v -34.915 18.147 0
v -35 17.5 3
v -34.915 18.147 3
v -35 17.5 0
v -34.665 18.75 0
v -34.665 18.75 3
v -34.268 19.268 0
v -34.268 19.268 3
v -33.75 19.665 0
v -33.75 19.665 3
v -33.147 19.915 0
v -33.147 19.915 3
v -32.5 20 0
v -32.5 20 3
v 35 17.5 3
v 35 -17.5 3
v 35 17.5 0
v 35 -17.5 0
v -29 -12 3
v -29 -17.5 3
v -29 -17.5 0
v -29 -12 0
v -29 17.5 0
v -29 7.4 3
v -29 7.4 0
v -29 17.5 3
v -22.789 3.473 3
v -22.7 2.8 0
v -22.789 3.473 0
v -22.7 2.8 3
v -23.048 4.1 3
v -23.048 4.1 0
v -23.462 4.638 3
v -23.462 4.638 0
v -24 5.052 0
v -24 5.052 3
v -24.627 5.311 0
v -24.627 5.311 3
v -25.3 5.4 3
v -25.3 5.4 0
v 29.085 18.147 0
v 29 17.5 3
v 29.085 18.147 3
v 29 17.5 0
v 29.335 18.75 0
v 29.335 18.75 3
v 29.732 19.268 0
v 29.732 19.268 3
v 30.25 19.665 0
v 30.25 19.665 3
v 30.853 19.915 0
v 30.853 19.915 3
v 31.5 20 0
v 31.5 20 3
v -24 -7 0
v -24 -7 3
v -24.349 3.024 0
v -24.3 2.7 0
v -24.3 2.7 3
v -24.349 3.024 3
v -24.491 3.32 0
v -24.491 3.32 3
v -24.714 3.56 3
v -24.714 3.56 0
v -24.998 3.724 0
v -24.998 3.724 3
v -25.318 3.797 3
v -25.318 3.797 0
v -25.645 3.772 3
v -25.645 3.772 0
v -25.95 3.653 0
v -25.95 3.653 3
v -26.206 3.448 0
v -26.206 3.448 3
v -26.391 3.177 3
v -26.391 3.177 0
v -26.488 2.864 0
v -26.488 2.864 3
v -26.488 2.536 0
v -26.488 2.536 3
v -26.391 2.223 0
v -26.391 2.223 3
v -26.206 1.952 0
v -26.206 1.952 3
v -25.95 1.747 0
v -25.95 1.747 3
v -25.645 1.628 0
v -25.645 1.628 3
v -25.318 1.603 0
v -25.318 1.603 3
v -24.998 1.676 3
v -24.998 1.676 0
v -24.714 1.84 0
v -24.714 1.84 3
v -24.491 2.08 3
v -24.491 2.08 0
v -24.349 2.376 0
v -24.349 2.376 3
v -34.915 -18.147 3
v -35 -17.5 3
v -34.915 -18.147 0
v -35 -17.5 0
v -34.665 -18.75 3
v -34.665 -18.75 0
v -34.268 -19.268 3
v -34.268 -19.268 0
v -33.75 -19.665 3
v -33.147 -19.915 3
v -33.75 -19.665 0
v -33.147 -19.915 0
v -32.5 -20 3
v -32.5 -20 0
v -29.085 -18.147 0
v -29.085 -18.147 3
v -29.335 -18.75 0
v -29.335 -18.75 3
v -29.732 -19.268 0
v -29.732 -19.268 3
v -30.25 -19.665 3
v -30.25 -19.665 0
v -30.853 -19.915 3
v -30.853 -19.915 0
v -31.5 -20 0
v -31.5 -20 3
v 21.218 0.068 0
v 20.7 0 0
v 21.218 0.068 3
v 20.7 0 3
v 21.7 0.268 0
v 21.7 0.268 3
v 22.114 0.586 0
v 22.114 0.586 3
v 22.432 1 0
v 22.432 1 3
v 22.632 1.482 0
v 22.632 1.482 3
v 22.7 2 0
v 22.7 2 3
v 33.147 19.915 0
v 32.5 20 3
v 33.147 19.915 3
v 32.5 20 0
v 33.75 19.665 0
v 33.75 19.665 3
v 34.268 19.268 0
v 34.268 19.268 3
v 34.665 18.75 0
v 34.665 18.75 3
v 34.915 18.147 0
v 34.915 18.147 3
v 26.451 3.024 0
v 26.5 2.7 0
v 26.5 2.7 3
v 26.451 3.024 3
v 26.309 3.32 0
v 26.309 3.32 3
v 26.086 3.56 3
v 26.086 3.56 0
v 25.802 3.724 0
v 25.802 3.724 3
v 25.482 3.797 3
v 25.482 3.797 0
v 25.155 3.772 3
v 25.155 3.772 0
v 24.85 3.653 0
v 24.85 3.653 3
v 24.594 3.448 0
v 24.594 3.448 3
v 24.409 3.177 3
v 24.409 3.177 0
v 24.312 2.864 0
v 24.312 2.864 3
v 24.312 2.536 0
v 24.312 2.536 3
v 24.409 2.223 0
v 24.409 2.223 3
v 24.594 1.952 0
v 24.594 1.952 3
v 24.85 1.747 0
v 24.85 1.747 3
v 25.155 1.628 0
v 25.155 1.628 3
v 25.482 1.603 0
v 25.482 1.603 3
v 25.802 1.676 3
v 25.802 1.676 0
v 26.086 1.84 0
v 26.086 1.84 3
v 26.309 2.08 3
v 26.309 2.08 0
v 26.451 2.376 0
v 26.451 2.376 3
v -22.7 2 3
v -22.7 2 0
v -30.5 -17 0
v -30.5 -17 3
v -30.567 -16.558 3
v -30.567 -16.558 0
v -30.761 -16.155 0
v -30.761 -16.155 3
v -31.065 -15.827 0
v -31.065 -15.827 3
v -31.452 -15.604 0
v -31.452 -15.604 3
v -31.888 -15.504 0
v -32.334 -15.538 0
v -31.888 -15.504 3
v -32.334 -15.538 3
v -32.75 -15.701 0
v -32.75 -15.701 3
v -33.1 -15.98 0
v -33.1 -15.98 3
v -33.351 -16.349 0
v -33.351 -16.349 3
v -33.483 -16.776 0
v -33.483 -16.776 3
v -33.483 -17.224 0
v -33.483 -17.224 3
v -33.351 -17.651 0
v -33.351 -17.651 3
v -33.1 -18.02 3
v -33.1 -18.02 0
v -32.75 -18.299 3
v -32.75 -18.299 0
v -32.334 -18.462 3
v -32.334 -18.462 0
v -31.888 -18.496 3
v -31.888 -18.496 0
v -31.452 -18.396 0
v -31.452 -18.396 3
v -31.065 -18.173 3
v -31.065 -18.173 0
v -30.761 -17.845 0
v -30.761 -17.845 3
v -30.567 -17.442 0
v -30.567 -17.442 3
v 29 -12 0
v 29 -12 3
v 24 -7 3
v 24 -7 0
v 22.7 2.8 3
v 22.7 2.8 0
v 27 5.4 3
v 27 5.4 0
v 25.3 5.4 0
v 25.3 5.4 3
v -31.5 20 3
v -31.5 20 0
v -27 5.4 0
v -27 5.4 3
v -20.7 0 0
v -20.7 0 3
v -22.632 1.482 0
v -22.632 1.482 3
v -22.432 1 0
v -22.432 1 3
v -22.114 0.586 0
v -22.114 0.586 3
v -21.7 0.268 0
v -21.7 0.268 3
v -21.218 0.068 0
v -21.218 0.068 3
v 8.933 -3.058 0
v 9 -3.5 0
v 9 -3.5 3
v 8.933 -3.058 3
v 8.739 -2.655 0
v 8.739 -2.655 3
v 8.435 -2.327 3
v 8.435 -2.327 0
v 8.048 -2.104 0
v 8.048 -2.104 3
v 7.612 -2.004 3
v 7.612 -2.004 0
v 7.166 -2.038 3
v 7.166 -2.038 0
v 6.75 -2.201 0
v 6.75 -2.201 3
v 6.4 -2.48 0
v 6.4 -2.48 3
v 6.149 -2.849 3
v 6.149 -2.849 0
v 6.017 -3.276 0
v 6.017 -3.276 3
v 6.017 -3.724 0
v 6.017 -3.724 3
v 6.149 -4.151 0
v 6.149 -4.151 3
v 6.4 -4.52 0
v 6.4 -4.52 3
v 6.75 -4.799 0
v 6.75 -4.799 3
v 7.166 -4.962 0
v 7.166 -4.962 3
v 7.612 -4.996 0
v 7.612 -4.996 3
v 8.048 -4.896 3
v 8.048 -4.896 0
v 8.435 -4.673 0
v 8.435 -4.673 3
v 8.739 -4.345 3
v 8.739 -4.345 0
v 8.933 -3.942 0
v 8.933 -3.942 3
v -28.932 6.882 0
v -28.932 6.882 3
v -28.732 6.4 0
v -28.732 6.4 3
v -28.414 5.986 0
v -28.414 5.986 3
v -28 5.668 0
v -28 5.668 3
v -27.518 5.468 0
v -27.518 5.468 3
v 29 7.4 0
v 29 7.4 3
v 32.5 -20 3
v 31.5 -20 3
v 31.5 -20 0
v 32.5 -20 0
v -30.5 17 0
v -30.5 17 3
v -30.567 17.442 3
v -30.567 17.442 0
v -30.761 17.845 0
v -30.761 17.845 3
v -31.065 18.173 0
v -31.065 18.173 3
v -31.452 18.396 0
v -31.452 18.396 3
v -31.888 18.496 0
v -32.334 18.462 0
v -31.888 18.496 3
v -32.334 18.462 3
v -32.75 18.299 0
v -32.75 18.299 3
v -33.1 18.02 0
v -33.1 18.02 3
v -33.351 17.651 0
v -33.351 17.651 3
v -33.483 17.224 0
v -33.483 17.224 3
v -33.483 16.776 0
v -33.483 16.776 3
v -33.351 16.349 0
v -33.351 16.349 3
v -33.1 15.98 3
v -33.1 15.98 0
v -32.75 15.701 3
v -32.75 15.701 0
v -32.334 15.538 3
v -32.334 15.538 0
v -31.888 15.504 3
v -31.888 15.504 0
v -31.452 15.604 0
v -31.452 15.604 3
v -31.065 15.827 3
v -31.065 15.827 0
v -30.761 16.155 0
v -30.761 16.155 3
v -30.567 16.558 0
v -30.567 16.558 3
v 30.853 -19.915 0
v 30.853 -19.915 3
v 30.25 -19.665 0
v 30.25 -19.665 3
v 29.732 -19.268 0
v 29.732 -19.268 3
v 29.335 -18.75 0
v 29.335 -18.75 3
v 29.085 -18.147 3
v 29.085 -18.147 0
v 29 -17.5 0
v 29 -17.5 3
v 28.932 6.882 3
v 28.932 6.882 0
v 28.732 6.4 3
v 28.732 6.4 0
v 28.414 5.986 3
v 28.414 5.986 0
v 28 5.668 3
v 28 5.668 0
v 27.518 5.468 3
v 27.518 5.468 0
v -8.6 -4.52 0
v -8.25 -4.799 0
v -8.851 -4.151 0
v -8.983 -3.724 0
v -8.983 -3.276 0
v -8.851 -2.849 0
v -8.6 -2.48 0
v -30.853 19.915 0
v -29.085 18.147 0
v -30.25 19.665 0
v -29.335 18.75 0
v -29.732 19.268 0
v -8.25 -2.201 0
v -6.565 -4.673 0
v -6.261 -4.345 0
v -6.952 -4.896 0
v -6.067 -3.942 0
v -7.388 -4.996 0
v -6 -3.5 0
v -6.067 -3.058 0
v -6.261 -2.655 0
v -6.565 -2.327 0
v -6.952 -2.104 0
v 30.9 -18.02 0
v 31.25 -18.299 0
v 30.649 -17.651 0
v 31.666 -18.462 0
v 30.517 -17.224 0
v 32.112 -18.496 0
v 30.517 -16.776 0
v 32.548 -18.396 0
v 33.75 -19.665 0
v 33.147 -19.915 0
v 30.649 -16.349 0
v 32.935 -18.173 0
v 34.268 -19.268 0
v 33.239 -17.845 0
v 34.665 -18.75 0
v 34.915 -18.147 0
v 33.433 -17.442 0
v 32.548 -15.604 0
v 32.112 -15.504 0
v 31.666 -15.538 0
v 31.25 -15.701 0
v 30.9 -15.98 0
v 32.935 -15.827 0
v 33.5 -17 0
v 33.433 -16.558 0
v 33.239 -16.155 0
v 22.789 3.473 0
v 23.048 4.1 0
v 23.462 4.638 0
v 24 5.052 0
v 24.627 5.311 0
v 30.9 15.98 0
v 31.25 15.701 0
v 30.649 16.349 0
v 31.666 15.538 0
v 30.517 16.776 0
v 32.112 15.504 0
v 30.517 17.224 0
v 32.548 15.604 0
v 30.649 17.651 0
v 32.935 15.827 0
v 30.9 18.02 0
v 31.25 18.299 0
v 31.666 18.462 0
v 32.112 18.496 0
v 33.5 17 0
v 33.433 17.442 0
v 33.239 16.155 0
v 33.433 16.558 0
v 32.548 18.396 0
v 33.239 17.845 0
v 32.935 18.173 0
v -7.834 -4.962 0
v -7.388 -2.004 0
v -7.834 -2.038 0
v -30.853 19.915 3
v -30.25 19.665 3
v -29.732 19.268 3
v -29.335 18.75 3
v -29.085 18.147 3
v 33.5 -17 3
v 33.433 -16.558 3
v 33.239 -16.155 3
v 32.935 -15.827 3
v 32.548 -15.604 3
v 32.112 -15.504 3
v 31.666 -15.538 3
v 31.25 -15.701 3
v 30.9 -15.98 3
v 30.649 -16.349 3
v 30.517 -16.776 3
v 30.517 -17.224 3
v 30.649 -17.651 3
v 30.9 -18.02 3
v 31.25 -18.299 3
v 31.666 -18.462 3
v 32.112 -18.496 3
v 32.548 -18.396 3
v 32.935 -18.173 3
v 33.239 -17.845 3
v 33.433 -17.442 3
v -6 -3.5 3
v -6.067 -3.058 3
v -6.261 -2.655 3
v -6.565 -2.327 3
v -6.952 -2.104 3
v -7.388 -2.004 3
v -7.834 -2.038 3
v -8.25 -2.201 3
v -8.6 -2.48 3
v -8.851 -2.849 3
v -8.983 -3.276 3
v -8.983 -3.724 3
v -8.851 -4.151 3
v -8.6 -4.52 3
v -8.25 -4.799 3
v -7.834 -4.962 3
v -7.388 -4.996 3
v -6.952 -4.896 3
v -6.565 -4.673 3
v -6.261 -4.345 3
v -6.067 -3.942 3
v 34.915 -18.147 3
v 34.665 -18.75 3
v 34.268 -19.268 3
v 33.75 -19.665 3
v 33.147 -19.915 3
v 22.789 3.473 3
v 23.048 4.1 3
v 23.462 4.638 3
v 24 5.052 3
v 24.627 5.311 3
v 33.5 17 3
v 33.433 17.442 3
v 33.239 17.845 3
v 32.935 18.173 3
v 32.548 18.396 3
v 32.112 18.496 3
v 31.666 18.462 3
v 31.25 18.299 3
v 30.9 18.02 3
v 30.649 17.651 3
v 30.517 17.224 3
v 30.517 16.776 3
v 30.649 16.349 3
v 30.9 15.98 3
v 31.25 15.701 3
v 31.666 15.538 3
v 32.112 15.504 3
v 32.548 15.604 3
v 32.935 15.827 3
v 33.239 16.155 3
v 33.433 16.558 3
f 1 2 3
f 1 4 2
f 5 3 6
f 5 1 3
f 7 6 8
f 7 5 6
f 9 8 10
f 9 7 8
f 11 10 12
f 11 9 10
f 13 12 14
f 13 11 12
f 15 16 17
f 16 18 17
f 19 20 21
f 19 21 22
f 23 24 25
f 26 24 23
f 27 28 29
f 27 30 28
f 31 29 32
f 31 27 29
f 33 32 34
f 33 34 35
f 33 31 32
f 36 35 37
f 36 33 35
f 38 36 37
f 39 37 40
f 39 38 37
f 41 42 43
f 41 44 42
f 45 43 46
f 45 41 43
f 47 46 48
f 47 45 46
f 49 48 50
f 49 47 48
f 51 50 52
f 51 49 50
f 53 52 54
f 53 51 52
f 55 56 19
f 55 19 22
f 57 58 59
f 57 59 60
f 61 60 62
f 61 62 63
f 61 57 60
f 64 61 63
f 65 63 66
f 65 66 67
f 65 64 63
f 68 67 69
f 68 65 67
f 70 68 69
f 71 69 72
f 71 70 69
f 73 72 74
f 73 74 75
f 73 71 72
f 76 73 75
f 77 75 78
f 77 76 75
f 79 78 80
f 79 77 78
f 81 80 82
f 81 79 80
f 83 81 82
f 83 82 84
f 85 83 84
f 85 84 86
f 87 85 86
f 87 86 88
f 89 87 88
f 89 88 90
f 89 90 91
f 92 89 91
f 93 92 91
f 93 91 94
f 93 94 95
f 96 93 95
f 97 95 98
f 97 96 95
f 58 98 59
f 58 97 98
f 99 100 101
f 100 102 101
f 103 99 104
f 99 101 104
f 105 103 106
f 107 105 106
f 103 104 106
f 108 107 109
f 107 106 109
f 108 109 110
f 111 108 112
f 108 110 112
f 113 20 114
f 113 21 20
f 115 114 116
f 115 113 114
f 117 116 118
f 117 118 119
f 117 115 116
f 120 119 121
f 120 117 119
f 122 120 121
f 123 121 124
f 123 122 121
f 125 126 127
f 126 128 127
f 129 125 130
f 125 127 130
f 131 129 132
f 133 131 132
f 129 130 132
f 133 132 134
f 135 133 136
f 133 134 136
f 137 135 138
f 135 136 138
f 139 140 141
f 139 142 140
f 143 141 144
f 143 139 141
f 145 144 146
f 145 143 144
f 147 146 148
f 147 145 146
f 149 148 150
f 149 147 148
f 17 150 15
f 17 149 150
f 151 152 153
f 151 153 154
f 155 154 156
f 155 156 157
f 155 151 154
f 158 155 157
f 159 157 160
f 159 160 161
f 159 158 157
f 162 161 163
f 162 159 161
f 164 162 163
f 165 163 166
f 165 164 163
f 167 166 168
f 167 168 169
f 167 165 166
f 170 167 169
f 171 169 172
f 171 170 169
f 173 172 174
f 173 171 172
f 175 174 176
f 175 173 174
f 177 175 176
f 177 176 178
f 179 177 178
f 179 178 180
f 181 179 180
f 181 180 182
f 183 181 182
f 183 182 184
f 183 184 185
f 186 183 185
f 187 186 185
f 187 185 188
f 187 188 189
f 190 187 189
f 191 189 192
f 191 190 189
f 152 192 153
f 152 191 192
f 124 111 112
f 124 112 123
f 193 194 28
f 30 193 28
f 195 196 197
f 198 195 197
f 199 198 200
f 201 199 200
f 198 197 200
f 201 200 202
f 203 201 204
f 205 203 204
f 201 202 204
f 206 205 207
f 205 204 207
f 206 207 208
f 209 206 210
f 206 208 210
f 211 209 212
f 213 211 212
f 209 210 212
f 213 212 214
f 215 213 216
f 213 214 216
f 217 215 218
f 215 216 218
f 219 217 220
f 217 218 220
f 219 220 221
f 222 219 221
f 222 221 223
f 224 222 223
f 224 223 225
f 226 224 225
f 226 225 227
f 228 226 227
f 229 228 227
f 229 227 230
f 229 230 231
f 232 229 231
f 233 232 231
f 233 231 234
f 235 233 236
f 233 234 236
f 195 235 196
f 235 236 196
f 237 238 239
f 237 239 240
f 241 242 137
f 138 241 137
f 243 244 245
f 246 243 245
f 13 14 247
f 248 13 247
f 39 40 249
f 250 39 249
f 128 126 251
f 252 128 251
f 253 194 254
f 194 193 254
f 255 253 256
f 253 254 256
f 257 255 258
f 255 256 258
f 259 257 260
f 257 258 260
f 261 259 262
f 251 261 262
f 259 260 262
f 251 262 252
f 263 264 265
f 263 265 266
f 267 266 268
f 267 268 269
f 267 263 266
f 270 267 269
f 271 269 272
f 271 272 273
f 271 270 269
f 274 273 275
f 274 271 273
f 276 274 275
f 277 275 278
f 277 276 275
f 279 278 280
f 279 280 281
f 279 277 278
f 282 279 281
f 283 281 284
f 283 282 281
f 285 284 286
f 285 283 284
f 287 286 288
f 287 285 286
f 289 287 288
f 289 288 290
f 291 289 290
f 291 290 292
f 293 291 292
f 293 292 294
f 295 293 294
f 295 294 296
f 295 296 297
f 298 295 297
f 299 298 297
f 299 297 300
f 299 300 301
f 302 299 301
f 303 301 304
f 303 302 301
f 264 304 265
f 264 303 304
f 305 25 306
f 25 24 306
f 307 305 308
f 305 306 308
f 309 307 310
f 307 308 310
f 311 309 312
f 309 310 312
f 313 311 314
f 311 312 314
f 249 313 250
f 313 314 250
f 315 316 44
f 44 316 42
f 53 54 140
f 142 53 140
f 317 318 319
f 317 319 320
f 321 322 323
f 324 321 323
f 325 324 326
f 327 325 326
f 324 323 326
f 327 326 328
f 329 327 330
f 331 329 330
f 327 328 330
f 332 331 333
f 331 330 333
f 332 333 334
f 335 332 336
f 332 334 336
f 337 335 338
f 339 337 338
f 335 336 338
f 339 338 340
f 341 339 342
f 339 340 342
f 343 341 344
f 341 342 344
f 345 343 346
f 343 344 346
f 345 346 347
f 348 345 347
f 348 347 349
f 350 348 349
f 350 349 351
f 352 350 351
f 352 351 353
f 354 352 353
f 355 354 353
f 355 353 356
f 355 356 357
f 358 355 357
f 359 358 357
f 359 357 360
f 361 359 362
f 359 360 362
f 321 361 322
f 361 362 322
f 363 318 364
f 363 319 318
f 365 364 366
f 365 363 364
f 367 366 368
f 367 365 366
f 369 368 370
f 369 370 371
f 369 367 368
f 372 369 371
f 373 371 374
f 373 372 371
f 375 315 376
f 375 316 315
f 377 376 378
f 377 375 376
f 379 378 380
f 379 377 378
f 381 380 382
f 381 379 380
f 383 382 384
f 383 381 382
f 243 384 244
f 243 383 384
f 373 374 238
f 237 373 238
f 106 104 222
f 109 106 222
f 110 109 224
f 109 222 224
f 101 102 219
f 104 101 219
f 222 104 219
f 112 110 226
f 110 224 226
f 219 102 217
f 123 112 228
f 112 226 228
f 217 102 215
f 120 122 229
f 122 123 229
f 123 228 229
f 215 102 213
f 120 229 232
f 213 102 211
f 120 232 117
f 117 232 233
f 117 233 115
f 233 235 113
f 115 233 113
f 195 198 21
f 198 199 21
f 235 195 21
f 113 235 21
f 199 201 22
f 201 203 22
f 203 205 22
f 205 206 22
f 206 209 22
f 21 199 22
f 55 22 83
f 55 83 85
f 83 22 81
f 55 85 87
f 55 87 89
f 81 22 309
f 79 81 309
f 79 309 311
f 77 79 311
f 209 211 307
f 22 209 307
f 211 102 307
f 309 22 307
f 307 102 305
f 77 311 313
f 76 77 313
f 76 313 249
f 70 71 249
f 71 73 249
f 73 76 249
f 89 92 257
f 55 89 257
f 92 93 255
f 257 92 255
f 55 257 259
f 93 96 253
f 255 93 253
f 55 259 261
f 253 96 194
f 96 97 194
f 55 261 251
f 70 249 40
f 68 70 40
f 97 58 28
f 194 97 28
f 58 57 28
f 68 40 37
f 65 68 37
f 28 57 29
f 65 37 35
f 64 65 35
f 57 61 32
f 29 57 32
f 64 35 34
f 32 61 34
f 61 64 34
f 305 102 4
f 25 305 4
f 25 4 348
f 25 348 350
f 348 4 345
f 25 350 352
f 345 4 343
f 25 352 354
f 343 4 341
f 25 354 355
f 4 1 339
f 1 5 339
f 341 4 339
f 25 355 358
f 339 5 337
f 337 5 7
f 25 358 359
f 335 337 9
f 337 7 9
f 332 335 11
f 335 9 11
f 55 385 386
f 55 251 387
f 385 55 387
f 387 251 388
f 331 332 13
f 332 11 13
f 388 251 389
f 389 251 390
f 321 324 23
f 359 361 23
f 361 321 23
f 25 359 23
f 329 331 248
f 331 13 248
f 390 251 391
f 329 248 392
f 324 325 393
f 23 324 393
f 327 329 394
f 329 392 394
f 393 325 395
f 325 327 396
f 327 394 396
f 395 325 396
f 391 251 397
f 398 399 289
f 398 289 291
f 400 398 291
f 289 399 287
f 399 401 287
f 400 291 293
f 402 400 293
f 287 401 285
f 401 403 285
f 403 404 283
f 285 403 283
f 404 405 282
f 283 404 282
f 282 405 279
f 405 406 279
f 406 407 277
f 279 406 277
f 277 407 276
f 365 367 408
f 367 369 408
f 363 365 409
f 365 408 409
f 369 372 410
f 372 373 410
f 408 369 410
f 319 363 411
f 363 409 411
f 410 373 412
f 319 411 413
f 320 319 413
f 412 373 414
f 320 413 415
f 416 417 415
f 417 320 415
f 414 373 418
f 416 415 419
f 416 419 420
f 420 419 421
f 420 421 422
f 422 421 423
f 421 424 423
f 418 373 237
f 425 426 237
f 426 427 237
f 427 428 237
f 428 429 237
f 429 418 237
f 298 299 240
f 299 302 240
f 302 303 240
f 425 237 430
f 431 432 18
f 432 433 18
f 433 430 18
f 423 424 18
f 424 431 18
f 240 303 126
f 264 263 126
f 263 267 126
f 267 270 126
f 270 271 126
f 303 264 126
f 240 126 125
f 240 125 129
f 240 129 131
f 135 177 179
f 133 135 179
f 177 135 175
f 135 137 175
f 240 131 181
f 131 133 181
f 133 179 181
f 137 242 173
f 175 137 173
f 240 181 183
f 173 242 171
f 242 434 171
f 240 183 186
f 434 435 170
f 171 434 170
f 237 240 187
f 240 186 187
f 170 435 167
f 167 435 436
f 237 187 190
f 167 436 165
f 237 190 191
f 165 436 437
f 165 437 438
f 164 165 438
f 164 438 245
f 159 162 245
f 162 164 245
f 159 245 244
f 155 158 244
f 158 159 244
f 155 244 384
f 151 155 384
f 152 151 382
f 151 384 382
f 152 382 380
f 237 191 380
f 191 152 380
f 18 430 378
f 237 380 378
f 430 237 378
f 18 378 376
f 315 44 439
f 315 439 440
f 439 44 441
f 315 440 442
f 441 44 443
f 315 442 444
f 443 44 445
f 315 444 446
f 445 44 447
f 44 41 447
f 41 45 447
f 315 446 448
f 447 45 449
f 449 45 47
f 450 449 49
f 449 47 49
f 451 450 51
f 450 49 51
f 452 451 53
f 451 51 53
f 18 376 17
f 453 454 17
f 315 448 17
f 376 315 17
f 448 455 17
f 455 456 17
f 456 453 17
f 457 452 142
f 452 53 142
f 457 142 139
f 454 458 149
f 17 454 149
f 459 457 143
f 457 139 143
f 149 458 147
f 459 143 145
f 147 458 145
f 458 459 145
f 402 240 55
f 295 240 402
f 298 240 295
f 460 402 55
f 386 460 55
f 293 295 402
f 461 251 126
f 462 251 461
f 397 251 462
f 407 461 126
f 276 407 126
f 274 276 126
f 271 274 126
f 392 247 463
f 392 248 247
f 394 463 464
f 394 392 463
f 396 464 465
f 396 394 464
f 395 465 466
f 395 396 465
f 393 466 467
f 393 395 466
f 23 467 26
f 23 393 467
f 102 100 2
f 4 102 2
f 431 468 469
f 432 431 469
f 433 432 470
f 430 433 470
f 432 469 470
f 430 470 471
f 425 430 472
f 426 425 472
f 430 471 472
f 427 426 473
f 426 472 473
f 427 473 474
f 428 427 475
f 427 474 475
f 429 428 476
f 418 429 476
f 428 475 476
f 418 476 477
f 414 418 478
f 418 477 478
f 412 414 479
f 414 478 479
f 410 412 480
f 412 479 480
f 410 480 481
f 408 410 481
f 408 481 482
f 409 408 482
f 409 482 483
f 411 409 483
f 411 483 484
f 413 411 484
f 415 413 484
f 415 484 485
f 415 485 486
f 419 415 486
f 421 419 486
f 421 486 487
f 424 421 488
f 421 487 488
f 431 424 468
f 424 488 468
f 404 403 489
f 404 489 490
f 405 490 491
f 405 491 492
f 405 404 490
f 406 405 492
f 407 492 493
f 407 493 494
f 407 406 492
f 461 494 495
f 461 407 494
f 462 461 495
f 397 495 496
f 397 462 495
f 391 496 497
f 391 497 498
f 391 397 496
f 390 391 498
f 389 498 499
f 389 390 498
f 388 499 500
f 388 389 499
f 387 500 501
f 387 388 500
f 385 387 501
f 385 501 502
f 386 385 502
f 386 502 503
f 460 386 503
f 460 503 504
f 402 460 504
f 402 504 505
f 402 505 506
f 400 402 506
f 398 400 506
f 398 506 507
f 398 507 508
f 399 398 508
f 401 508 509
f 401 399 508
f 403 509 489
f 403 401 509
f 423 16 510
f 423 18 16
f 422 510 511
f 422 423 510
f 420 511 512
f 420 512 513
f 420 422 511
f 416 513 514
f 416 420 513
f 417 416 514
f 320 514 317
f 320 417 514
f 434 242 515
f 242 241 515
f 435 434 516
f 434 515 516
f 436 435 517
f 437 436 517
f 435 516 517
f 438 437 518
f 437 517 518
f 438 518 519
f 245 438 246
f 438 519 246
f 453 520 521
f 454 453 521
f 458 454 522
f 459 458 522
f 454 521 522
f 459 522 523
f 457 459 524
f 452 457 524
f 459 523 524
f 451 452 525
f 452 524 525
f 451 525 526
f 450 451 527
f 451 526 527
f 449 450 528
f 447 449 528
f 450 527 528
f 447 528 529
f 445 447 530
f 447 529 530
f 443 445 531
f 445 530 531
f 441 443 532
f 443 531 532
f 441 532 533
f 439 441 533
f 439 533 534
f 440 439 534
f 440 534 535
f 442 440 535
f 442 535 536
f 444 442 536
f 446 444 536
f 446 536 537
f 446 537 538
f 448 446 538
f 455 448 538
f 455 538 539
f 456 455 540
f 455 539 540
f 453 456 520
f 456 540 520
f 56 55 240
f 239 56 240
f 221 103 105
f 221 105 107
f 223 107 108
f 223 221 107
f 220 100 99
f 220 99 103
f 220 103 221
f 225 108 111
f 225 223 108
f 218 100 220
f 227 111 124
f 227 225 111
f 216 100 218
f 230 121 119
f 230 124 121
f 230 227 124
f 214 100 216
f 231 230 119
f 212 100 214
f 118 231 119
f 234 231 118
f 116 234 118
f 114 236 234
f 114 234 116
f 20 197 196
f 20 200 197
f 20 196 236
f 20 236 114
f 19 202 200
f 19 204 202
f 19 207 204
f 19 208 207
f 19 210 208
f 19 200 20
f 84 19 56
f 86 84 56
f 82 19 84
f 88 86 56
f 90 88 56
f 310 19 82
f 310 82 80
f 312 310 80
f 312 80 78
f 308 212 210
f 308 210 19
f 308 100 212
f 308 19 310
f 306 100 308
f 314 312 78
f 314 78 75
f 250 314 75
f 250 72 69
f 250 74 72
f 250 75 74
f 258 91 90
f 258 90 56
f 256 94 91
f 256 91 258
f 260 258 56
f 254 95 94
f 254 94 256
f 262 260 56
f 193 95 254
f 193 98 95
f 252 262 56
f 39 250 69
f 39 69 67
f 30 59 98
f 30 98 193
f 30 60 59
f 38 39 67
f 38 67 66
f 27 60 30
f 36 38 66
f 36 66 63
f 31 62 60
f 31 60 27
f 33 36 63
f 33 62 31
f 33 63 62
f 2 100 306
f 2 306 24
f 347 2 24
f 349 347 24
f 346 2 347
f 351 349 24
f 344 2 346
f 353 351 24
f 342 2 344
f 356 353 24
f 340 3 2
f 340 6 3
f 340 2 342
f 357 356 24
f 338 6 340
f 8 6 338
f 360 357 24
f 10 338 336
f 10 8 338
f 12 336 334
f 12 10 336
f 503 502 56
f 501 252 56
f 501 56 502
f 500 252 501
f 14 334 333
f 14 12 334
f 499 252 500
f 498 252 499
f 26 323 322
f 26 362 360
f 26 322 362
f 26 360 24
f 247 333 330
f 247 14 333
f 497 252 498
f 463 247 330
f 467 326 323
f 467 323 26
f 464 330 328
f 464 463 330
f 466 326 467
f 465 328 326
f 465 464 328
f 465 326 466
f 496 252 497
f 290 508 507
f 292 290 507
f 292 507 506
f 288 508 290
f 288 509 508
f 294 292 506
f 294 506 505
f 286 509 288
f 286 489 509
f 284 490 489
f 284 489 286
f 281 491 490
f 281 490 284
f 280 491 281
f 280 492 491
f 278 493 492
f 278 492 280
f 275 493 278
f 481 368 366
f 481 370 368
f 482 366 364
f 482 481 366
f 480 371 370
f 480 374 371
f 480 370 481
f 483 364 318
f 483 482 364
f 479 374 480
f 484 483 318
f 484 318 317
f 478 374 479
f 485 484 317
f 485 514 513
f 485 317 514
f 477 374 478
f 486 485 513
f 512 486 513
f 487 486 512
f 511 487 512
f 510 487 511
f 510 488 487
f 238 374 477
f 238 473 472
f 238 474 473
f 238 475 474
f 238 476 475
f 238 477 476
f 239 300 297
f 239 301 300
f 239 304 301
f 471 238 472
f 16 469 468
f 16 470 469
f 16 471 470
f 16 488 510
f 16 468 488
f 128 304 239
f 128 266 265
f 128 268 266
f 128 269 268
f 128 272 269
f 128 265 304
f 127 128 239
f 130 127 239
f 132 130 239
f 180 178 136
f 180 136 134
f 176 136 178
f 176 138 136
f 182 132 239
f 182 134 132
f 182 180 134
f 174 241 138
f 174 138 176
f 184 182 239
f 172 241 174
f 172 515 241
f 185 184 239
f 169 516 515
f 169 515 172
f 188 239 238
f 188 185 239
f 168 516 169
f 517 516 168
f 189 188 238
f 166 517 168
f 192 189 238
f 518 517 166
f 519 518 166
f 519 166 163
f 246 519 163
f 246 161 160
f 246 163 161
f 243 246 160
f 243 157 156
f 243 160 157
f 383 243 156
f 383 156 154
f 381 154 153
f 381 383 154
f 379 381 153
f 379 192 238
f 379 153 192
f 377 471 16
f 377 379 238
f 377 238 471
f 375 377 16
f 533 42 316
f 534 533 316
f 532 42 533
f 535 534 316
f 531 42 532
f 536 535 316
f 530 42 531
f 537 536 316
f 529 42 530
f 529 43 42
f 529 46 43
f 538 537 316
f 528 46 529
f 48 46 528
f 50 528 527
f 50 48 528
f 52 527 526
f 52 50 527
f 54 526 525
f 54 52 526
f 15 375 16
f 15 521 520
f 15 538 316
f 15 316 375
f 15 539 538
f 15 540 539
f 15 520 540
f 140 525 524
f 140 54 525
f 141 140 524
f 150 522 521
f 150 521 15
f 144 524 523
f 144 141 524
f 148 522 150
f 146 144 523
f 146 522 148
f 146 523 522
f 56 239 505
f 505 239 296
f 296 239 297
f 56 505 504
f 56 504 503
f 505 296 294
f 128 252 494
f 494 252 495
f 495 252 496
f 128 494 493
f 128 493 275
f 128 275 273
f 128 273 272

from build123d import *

# Parameters (mm, degrees)
SKETCH_R     = 1.5
SKETCH_R_2   = 1.1
PAD_DEPTH    = 3
FILLET_R     = 2.6
SKETCH001_W  = 6
SKETCH001_H  = 40
SKETCH001_R  = 1.5
PAD001_DEPTH = 3
FILLET001_R  = 2.5
CHAMFER_SIZE = 5
FILLET002_R  = 2


with BuildPart() as part:
    # Sketch → Pad (new body)
    with BuildSketch(Plane.XY):
        Polygon((-22.7, 0), (-22.7, 5.4), (-35, 5.4), (-35, -7), (35, -7), (35, 5.4), (22.7, 5.4), (22.7, 0), align=None)
        with Locations((-7.5, -3.5)):
            Circle(SKETCH_R, mode=Mode.SUBTRACT)
        with Locations((7.5, -3.5)):
            Circle(SKETCH_R, mode=Mode.SUBTRACT)
        with Locations((-25.4, 2.7)):
            Circle(SKETCH_R_2, mode=Mode.SUBTRACT)
        with Locations((25.4, 2.7)):
            Circle(SKETCH_R_2, mode=Mode.SUBTRACT)
    extrude(amount=PAD_DEPTH)

    # Fillet
    fillet_edges = [part.edges().sort_by_distance(p)[0] for p in [
        (-22.7, 5.4, 1.5),
        (22.7, 5.4, 1.5),
    ]]
    fillet(fillet_edges, radius=FILLET_R)

    # Sketch001 → Pad001 (new body)
    with BuildSketch(Plane.XY.offset(3)):
        with Locations((-32, 0)):
            Rectangle(SKETCH001_W, SKETCH001_H)
        with Locations((-32, 17)):
            Circle(SKETCH001_R, mode=Mode.SUBTRACT)
        with Locations((-32, -17)):
            Circle(SKETCH001_R, mode=Mode.SUBTRACT)
        with Locations((32, 0)):
            Rectangle(SKETCH001_W, SKETCH001_H)
        with Locations((32, 17)):
            Circle(SKETCH001_R, mode=Mode.SUBTRACT)
        with Locations((32, -17)):
            Circle(SKETCH001_R, mode=Mode.SUBTRACT)
    extrude(amount=-PAD001_DEPTH)

    # Fillet001
    fillet001_edges = [part.edges().sort_by_distance(p)[0] for p in [
        (-35, -20, 1.5),
        (-29, -20, 1.5),
        (29, -20, 1.5),
        (35, -20, 1.5),
        (35, 20, 1.5),
        (29, 20, 1.5),
        (-29, 20, 1.5),
        (-35, 20, 1.5),
    ]]
    fillet(fillet001_edges, radius=FILLET001_R)

    # Chamfer
    chamfer_edges = [part.edges().sort_by_distance(p)[0] for p in [
        (-29, -7, 1.5),
        (29, -7, 1.5),
    ]]
    chamfer(chamfer_edges, length=CHAMFER_SIZE)

    # Fillet002
    fillet002_edges = [part.edges().sort_by_distance(p)[0] for p in [
        (-29, 5.4, 1.5),
        (-22.7, 0, 1.5),
        (22.7, 0, 1.5),
        (29, 5.4, 1.5),
    ]]
    fillet(fillet002_edges, radius=FILLET002_R)


solid = part.part
